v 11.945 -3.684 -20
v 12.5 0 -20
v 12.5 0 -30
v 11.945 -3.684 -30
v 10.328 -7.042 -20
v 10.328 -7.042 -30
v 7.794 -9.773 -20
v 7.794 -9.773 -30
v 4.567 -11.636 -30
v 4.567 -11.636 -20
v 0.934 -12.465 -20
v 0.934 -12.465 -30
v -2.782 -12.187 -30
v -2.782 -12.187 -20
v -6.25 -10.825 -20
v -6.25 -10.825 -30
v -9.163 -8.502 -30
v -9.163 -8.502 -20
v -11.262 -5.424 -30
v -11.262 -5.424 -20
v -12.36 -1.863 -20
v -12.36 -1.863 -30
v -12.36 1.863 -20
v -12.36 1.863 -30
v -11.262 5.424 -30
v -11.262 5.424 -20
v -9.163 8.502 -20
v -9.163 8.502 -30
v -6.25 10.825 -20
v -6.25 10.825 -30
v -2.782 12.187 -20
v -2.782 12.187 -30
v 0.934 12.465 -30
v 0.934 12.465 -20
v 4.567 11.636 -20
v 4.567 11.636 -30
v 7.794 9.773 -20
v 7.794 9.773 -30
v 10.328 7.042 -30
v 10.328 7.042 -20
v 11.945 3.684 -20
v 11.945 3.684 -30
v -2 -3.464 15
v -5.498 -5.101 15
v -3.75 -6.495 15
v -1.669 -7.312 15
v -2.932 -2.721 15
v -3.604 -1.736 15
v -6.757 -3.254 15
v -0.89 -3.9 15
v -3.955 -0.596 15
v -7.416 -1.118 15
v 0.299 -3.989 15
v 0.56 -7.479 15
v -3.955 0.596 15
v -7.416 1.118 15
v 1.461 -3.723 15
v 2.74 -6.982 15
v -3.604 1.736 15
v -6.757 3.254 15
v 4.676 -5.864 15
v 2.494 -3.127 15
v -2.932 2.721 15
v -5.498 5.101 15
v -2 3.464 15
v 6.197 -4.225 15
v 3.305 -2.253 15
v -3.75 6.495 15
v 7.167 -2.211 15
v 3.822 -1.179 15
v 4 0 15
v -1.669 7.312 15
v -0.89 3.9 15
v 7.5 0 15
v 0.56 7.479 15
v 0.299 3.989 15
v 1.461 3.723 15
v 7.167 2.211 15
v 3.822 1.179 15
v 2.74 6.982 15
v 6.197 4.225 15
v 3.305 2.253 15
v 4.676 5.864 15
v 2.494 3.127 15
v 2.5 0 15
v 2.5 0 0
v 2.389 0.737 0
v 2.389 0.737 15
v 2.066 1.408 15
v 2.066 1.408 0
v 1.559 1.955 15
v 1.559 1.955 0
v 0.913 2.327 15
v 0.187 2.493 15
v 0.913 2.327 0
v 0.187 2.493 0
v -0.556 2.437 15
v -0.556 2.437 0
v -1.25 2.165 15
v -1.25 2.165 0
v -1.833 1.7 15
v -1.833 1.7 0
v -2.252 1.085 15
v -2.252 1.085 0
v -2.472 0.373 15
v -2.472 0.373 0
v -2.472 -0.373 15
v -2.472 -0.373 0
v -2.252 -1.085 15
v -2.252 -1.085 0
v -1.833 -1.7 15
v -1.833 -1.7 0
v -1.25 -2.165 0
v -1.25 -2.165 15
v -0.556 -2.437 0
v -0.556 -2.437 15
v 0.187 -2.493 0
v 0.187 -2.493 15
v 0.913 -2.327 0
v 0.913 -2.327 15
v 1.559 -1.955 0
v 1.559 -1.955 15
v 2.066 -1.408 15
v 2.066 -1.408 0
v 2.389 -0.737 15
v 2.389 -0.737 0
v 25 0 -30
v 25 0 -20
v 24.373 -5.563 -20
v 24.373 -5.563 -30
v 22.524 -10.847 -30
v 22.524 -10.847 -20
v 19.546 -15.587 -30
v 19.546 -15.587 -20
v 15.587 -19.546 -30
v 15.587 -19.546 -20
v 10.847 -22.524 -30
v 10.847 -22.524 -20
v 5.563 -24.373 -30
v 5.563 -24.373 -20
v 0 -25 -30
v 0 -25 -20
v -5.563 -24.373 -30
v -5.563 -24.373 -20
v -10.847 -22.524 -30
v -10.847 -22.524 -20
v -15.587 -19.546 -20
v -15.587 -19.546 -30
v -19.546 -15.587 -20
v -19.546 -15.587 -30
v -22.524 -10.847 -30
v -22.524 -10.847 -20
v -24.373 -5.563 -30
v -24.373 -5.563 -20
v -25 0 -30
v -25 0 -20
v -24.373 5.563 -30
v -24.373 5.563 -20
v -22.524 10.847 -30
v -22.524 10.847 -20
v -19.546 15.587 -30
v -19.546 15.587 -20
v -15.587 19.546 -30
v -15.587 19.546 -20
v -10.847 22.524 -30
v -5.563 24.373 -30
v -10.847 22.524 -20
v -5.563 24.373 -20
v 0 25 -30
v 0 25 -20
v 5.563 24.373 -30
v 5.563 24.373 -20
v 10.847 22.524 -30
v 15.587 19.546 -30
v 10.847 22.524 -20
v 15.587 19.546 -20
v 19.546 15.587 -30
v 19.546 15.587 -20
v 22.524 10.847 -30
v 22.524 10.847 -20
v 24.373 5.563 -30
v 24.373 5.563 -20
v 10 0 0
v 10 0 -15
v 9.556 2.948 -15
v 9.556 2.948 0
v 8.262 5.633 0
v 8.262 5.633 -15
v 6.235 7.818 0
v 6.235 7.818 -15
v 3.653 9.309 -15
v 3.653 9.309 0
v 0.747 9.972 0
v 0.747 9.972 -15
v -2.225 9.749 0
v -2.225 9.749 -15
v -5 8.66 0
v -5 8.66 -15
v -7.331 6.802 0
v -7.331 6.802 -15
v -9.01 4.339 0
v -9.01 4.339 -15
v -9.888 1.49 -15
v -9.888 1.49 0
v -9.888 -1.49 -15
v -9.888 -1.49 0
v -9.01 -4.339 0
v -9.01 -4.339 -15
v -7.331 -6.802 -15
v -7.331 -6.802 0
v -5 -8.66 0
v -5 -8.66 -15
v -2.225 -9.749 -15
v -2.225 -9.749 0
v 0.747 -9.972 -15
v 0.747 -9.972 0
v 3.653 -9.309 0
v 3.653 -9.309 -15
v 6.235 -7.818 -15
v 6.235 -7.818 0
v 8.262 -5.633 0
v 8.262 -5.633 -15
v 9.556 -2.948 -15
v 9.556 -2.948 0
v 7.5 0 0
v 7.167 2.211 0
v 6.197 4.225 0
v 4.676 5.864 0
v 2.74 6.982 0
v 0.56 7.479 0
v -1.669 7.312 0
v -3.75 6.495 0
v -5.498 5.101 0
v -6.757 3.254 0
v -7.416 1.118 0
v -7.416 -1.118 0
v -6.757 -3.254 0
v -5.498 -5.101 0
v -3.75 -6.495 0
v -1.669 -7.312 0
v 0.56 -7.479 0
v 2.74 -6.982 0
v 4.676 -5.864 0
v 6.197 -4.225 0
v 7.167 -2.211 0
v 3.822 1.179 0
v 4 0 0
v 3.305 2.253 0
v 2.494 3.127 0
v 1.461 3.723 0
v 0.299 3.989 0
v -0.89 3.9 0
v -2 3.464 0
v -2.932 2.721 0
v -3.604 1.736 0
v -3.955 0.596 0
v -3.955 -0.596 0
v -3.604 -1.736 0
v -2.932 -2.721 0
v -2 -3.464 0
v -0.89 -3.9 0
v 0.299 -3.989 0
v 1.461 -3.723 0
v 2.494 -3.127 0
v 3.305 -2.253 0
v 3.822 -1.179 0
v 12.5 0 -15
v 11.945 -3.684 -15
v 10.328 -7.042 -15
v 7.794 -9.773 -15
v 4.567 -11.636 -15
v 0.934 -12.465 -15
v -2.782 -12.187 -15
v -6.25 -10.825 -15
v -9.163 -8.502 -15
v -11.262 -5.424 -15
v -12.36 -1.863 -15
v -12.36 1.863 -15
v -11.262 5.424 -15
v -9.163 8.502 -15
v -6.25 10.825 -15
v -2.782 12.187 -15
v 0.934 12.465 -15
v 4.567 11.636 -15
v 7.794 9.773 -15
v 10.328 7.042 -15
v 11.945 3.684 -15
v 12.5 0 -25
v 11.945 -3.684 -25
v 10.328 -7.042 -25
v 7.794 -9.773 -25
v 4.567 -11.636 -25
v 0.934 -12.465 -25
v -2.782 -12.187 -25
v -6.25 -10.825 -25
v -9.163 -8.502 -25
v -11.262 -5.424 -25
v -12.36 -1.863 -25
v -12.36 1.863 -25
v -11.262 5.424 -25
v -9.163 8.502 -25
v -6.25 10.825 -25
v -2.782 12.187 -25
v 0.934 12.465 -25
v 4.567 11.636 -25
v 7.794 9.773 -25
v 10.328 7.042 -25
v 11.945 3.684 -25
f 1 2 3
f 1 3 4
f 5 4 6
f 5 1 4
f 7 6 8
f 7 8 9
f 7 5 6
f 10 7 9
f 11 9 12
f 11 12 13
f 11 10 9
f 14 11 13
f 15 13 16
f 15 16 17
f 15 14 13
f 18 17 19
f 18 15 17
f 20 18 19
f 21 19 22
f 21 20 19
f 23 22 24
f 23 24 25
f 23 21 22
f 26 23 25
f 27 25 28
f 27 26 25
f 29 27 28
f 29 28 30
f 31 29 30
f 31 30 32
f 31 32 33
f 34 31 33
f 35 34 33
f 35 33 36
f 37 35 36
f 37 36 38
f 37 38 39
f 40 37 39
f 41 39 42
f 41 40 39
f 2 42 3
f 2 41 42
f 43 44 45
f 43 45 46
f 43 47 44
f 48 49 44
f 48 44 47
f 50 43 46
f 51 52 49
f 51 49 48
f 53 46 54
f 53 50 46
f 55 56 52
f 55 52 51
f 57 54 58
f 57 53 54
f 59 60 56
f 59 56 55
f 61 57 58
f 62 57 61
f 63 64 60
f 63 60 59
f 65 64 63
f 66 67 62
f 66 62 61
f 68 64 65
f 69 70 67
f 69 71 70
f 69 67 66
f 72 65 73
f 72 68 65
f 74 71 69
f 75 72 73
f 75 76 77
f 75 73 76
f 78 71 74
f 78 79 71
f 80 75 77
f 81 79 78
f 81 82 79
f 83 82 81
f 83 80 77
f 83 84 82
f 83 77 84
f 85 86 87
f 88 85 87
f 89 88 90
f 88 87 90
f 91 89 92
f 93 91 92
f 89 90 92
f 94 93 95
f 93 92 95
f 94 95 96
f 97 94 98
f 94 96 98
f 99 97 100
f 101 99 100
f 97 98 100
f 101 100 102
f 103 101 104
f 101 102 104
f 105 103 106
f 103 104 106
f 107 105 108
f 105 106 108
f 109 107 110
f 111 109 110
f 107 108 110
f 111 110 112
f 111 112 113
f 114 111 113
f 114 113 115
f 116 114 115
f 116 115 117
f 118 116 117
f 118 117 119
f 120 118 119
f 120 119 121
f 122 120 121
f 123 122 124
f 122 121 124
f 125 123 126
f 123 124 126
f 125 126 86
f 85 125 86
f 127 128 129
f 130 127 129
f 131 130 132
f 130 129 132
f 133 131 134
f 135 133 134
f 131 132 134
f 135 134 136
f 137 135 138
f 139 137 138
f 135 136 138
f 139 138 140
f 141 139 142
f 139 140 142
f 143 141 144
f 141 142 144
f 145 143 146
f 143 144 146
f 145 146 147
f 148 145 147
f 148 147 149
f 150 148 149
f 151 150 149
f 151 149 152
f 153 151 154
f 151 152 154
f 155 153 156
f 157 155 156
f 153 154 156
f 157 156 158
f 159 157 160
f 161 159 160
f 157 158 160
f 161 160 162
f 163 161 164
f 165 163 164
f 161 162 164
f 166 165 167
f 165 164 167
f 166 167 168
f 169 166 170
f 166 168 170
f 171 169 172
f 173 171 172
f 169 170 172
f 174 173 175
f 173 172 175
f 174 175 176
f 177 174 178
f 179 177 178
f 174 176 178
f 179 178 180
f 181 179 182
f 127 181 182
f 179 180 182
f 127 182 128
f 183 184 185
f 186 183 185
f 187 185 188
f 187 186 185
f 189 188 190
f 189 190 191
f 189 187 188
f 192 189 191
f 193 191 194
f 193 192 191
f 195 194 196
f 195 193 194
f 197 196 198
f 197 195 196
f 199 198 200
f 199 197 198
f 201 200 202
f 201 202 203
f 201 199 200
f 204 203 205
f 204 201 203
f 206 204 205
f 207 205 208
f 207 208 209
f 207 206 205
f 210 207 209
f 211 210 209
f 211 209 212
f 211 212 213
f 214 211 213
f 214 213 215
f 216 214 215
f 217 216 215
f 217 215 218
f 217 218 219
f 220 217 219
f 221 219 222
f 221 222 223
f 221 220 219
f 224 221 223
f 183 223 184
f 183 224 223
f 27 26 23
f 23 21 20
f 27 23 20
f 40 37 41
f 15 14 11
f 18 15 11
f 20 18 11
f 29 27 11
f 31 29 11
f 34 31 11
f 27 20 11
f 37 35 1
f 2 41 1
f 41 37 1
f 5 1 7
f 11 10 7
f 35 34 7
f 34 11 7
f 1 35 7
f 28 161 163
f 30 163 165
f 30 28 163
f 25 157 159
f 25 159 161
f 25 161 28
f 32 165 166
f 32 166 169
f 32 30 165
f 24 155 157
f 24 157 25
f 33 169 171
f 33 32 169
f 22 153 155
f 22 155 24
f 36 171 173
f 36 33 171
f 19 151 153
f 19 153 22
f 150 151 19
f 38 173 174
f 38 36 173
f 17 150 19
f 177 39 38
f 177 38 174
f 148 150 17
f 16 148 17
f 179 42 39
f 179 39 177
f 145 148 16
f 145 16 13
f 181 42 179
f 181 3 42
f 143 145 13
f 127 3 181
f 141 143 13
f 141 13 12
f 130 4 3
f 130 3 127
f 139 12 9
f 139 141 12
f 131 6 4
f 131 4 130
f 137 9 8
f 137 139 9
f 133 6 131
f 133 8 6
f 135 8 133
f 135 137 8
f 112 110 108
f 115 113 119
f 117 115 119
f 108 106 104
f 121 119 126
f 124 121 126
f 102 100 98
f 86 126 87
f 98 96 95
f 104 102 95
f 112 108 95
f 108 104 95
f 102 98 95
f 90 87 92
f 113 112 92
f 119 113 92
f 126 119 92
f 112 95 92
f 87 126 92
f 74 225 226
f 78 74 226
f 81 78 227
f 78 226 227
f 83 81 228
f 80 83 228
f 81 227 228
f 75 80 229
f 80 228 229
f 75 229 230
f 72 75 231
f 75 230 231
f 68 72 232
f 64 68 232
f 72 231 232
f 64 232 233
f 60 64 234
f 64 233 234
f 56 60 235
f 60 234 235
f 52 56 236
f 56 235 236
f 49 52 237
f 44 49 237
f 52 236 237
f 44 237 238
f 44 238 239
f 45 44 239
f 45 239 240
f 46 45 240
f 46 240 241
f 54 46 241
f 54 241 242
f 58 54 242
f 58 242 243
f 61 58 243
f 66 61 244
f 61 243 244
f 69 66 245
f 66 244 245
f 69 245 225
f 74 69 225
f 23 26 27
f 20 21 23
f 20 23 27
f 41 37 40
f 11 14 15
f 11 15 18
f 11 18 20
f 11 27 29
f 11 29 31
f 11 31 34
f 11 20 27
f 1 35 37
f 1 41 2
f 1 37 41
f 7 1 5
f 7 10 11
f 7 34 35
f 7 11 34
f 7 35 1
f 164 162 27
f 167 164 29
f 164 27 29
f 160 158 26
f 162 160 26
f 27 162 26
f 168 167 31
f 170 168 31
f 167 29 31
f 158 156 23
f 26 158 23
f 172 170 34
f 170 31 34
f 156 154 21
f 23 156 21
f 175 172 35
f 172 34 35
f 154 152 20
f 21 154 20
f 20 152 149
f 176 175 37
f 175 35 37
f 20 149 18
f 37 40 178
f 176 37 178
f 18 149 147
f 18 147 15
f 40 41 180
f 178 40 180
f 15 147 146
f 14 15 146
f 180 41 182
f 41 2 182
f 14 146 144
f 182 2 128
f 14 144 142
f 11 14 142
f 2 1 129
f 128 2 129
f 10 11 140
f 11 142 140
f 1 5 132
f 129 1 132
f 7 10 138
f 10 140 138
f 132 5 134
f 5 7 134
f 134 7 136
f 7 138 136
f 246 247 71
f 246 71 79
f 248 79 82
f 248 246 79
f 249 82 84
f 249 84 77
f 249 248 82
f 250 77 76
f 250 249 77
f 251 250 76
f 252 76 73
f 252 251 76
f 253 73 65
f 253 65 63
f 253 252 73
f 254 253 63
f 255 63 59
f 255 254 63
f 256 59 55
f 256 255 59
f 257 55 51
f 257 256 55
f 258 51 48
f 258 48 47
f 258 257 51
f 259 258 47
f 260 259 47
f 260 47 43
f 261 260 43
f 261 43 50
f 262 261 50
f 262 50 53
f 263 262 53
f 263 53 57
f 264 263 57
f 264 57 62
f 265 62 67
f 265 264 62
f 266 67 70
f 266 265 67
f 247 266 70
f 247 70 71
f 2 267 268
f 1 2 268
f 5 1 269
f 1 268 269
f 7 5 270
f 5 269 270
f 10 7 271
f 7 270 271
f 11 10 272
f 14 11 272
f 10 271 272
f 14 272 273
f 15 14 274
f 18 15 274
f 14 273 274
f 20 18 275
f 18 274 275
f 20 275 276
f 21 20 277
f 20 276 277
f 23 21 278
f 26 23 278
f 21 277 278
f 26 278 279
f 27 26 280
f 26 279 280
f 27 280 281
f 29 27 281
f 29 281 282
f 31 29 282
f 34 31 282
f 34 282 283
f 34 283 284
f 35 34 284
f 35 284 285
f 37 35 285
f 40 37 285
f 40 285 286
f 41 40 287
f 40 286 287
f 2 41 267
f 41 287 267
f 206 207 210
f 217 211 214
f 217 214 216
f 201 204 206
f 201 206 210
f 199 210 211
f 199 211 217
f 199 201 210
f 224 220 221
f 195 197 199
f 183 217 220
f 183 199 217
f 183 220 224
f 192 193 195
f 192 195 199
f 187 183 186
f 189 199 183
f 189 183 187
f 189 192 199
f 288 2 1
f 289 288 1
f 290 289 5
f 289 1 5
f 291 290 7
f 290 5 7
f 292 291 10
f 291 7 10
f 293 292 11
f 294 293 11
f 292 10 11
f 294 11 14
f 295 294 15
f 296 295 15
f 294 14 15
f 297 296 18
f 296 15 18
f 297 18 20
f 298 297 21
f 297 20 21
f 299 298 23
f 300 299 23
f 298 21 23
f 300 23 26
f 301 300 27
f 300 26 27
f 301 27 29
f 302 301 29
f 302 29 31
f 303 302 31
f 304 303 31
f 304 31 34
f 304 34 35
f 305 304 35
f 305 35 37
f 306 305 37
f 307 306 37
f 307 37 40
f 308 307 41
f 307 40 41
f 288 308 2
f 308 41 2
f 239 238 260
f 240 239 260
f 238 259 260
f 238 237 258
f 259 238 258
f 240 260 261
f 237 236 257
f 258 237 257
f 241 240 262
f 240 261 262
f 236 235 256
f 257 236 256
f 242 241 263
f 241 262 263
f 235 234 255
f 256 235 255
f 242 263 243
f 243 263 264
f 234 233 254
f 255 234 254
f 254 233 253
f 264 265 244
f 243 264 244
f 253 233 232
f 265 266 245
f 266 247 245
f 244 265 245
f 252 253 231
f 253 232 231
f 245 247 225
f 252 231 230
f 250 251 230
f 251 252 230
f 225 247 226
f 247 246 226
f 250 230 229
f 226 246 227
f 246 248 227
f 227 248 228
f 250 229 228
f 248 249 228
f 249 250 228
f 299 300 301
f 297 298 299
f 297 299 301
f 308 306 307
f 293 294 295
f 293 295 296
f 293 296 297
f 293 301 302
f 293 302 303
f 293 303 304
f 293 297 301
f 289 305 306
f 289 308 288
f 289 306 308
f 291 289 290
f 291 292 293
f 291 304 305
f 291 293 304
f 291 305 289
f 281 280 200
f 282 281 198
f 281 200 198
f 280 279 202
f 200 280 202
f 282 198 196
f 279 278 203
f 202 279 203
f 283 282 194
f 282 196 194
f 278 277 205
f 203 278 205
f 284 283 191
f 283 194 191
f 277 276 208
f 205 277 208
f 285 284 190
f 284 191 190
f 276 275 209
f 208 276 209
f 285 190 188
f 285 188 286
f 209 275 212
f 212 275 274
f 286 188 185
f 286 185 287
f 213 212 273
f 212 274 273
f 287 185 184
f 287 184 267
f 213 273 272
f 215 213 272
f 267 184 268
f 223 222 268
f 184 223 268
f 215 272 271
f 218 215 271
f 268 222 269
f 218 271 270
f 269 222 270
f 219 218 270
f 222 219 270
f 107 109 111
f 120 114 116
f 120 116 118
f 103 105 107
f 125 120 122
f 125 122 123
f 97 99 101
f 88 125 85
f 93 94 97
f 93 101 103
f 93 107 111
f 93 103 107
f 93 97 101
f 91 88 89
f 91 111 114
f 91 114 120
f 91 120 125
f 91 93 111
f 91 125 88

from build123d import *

# Parameters (mm, degrees)
F0_R     = 7.5
F0_R_2   = 4
F0_R_3   = 2.5
F1_DEPTH = 15
F2_R     = 10
F3_DEPTH = 15
F4_R     = 12.5
F5_DEPTH = 5
F7_R     = 25
F7_R_2   = 12.5
F8_DEPTH = 10
F6_R     = 12.5
F9_DEPTH = 5


with BuildPart() as f1:
    # F0 (on Top) → F1 (new body)
    with BuildSketch(Plane.XY):
        Circle(F0_R)
        Circle(F0_R_2, mode=Mode.SUBTRACT)
        Circle(F0_R_3)
    extrude(amount=F1_DEPTH)


with BuildPart() as f3:
    # F2 (on Top) → F3 (new body)
    with BuildSketch(Plane.XY):
        Circle(F2_R)
    extrude(amount=-F3_DEPTH)

    # F4 (on face) → F5 (join)
    with BuildSketch(Plane(origin=(0, 0, -15), x_dir=(1, 0, 0), z_dir=(0, 0, -1))):
        Circle(F4_R)
    extrude(amount=F5_DEPTH)

    # F7 (on face) → F8 (join)
    with BuildSketch(Plane(origin=(0, 0, -20), x_dir=(1, 0, 0), z_dir=(0, 0, -1))):
        Circle(F7_R)
        Circle(F7_R_2, mode=Mode.SUBTRACT)
    extrude(amount=F8_DEPTH)


with BuildPart() as f9:
    # F6 (on face) → F9 (new body)
    with BuildSketch(Plane(origin=(0, 0, -20), x_dir=(1, 0, 0), z_dir=(0, 0, -1))):
        Circle(F6_R)
    extrude(amount=F9_DEPTH)


solid = Compound([f1.part, f3.part, f9.part])
